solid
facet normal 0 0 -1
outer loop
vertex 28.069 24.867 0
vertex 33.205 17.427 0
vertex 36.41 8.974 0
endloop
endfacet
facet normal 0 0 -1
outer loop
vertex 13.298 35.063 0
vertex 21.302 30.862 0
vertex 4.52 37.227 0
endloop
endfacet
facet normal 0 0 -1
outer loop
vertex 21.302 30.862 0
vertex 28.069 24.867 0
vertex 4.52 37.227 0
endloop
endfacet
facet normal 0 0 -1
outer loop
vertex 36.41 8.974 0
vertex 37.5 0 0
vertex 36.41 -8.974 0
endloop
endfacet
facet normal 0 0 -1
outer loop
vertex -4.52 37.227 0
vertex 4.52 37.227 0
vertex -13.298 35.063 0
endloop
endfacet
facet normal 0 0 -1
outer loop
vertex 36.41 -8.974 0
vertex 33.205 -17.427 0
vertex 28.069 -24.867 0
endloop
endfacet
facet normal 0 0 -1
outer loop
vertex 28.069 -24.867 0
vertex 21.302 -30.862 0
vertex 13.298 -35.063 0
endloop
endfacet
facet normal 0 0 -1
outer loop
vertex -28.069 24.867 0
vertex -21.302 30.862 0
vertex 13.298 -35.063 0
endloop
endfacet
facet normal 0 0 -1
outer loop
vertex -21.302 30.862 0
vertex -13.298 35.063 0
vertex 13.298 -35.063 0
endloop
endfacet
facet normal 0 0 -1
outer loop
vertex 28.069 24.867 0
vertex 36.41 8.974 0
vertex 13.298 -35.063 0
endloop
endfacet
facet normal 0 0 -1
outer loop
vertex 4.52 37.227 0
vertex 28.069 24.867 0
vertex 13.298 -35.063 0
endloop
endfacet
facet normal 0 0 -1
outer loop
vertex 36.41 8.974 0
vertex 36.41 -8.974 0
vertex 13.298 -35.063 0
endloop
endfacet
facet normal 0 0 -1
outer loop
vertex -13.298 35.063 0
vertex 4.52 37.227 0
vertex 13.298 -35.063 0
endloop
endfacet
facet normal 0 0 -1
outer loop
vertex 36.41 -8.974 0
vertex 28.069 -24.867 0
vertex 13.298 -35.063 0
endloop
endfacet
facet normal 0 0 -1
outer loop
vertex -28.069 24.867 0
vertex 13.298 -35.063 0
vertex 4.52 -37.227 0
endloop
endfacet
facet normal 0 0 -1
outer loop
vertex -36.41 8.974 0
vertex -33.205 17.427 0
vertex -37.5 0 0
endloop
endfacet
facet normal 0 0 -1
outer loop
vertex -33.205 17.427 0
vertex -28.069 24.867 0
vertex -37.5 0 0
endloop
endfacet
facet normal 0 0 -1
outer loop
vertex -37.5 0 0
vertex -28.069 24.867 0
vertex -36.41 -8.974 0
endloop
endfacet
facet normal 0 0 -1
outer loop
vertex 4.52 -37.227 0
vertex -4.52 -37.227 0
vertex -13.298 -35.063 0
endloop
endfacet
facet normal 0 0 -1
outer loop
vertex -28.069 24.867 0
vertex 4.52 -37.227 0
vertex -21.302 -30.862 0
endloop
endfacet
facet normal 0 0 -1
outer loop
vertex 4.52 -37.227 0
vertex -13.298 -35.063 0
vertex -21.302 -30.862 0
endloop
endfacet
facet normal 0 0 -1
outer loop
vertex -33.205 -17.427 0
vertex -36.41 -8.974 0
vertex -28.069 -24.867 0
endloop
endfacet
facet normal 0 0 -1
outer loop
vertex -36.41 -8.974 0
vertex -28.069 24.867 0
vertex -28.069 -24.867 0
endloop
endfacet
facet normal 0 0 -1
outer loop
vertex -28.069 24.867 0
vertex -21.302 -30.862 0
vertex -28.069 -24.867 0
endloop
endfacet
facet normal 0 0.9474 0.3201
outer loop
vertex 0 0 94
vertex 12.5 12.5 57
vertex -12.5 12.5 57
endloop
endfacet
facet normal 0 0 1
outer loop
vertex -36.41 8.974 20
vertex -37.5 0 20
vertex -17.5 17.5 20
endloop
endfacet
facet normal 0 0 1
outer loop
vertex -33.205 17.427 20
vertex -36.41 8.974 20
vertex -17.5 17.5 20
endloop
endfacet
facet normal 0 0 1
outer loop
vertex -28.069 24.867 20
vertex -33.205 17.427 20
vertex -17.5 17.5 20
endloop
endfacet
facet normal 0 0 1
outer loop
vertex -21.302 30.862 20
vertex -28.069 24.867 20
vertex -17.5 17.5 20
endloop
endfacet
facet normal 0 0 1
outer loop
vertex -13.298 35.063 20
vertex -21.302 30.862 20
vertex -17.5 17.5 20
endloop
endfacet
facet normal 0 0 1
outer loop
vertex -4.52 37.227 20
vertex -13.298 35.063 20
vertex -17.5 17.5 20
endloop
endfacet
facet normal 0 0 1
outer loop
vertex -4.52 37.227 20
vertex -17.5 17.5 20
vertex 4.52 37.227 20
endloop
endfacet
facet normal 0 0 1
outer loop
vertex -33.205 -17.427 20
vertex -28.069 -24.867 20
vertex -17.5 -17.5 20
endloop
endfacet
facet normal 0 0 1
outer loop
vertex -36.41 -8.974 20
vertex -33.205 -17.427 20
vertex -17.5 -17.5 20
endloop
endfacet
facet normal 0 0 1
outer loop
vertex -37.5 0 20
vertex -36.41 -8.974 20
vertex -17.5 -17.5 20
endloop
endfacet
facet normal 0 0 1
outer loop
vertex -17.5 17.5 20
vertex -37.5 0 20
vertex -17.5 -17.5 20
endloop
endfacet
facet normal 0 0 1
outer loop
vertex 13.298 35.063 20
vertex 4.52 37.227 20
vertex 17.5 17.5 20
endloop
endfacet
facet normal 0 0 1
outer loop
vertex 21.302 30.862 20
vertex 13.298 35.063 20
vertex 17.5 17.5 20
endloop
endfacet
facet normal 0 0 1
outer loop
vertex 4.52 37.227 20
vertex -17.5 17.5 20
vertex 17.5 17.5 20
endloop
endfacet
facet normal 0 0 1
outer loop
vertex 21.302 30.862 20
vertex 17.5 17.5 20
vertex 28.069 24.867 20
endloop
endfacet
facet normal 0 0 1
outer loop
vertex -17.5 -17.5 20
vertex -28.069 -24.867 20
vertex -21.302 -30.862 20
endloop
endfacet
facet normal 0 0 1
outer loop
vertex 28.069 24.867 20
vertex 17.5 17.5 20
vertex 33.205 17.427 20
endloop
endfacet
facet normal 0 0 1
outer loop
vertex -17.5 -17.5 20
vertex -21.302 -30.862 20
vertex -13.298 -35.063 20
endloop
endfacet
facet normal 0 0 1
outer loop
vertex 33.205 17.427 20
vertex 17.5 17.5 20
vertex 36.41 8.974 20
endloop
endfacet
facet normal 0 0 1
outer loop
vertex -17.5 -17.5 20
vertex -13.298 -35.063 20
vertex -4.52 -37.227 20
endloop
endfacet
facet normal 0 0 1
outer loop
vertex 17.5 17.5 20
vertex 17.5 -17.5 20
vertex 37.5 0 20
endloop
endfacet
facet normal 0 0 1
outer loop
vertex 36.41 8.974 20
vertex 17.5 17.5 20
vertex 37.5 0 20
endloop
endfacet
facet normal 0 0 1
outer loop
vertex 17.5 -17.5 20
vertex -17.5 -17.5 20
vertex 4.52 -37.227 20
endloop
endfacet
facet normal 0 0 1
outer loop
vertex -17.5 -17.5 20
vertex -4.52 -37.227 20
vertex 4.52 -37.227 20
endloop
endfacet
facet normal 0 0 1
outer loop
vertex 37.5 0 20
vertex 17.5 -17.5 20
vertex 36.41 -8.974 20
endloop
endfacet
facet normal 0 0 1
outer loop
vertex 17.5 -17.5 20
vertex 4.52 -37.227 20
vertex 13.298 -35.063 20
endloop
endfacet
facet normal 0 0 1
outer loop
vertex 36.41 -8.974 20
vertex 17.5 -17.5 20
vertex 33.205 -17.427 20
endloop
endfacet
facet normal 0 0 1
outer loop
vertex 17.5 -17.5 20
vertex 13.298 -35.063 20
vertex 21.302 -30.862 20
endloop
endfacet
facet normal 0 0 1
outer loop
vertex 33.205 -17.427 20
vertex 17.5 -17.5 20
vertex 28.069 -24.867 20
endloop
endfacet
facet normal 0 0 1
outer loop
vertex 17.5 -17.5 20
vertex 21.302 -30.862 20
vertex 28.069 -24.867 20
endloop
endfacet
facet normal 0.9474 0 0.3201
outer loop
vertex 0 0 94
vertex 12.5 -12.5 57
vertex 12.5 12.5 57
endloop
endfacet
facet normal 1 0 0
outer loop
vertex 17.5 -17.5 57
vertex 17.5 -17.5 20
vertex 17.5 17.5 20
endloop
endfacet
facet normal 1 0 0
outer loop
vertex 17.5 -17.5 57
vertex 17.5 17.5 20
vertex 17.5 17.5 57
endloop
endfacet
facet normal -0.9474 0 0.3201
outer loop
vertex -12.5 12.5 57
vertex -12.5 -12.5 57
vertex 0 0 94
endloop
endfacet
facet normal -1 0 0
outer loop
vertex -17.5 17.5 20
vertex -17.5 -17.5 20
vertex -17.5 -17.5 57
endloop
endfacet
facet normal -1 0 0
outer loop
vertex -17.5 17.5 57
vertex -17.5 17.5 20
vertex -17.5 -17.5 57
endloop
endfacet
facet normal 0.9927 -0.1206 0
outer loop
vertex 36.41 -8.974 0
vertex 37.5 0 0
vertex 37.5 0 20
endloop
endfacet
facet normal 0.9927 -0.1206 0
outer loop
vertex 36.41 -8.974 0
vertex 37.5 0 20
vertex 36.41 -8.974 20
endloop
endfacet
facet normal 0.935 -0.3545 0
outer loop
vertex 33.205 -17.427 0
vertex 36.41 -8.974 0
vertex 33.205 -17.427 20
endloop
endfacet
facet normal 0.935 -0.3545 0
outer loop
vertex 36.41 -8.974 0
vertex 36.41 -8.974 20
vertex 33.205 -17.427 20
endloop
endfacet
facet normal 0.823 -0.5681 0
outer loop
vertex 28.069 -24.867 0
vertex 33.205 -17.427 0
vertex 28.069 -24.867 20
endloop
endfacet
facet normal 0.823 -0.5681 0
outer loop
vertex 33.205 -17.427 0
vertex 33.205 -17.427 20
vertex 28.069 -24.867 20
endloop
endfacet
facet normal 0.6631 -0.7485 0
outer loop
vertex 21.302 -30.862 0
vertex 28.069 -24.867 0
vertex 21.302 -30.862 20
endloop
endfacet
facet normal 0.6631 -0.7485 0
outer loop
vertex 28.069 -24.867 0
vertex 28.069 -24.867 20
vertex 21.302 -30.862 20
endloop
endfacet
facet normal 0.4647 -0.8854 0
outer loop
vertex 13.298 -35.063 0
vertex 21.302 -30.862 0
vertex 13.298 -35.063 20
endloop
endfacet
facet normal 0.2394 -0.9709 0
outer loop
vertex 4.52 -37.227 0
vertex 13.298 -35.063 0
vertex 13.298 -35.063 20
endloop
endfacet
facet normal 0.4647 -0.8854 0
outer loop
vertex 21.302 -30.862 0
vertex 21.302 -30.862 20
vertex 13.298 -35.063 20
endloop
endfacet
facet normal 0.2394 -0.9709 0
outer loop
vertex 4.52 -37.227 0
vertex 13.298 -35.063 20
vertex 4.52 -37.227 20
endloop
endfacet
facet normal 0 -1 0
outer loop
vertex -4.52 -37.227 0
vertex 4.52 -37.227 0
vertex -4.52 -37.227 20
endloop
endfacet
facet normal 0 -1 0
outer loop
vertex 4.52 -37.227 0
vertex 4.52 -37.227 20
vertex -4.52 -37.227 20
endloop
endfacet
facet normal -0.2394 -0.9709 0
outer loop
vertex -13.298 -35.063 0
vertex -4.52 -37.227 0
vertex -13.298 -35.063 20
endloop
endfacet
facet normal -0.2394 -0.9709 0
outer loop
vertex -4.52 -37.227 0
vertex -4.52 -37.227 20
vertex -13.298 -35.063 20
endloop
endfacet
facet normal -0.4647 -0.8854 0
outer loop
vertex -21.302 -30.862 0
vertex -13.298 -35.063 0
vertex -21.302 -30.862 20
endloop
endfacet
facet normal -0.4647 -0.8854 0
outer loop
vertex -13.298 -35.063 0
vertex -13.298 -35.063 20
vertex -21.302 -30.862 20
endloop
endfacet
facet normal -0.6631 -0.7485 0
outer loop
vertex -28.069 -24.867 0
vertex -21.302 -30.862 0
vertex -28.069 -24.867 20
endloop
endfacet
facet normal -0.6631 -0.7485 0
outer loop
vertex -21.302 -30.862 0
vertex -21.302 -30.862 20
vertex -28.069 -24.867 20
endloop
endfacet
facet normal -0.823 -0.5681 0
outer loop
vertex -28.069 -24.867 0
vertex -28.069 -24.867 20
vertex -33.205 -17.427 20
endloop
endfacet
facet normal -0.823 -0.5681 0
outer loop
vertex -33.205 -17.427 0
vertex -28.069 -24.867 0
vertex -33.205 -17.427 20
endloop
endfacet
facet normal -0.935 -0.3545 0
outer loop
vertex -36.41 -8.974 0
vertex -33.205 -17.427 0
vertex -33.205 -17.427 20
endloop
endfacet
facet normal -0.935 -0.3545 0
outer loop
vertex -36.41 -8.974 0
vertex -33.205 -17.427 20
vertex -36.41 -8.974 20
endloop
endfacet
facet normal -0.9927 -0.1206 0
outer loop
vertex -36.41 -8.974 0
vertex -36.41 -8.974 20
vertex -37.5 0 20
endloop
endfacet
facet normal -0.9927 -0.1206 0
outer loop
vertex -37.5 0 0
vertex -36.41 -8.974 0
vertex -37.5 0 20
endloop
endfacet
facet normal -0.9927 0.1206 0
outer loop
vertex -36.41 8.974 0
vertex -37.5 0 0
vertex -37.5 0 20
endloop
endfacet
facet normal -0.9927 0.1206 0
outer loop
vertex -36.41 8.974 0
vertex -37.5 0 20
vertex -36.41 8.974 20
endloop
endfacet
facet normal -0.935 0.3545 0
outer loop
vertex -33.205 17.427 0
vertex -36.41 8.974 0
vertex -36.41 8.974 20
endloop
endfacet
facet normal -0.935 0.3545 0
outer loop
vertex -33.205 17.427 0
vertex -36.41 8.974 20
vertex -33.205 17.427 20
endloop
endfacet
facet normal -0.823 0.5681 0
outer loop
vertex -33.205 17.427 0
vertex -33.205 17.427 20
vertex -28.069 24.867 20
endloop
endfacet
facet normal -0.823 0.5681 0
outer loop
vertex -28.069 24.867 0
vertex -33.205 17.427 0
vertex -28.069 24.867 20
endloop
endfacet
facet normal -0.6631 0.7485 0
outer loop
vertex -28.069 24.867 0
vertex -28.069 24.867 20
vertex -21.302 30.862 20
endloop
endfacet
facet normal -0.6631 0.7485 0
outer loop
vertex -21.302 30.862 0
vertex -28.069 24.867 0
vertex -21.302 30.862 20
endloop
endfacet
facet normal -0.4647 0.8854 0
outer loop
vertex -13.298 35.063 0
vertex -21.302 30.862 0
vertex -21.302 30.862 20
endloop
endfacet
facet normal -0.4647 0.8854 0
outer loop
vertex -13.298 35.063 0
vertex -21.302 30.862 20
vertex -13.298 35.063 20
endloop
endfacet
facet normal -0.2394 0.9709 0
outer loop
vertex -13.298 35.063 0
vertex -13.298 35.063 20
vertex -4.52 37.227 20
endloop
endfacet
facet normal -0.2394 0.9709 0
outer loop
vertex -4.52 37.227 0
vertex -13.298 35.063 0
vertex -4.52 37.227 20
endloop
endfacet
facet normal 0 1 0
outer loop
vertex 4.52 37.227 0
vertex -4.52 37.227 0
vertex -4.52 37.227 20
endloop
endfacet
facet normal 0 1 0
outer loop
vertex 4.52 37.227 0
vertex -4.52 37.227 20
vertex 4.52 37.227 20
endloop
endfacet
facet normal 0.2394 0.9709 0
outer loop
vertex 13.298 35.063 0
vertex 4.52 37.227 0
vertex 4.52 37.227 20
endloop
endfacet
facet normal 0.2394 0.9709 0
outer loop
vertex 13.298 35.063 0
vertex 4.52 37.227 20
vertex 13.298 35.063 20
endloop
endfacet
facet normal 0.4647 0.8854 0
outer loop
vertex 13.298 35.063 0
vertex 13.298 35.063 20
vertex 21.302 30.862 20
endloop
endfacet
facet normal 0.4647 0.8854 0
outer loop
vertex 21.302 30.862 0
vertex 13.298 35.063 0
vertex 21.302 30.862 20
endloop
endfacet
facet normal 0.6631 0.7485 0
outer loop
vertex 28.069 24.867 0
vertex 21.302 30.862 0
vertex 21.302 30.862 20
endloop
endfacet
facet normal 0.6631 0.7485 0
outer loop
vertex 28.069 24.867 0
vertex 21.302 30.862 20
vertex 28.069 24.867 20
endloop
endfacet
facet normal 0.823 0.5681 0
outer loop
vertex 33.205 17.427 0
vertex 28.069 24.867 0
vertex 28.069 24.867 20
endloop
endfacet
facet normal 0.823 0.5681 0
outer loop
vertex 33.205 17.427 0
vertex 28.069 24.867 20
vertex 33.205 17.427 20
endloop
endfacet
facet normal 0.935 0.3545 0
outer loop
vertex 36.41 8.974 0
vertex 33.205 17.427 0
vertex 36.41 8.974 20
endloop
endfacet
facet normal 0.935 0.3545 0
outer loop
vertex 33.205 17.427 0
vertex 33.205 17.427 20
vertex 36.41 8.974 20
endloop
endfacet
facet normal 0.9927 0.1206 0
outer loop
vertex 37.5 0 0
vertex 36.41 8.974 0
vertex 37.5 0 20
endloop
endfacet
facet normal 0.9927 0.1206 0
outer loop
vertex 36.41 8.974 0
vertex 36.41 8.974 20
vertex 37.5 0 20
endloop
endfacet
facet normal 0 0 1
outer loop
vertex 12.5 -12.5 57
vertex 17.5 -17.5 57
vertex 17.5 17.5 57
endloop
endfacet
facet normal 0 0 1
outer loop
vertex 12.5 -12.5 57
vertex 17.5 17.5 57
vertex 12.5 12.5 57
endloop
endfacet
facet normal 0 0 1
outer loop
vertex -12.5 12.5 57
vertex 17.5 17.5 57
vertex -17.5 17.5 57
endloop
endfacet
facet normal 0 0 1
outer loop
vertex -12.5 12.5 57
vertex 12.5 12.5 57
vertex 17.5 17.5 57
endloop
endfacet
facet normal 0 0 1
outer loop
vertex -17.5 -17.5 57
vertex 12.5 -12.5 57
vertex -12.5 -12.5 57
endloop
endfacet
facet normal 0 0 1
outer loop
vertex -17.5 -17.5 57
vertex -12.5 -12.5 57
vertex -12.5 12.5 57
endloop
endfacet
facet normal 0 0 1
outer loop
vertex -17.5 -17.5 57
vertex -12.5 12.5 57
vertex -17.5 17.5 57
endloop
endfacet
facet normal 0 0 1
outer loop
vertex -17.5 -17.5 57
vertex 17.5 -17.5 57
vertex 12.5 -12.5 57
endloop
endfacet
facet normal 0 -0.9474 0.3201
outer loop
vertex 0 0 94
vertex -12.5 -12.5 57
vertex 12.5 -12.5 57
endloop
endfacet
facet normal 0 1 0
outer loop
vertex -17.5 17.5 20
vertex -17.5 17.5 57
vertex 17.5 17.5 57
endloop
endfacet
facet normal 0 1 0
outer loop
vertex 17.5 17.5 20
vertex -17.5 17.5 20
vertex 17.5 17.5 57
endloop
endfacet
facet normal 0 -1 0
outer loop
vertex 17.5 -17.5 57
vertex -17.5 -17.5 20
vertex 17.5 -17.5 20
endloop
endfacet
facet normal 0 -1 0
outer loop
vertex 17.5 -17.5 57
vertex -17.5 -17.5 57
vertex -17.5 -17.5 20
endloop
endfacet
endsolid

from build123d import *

# Parameters (mm, degrees)
F2_DEPTH = 17.5
F3_W     = 12.5
F3_H     = 25


with BuildPart() as f1:
    # F0 (on Front) → F1 (revolve)
    with BuildSketch(Plane.XZ):
        Polygon((0, 20), (0, 0), (37.5, 0), (37.5, 20), (17.5, 20), align=None)
    revolve(axis=Axis((0, 0, 47), (0, 0, -1)))

    # F0 (on Front) → F2 (join, symmetric)
    with BuildSketch(Plane.XZ):
        Polygon((0, 57), (0, 20), (17.5, 20), (17.5, 57), (12.5, 57), align=None)
    extrude(amount=F2_DEPTH, both=True)

    # F3 (on face) → F6 section 0
    with BuildSketch(Plane.XY.offset(57), mode=Mode.PRIVATE) as f6_s0:
        with Locations((6.25, 0)):
            Rectangle(F3_W, F3_H)
    loft([f6_s0.sketch, Vertex(0, 0, 94)])

    # F7: F1 across plane


with BuildPart() as f1_1:
    add(f1.part)
    add(f1.part.mirror(Plane.YZ))


solid = f1_1.part
